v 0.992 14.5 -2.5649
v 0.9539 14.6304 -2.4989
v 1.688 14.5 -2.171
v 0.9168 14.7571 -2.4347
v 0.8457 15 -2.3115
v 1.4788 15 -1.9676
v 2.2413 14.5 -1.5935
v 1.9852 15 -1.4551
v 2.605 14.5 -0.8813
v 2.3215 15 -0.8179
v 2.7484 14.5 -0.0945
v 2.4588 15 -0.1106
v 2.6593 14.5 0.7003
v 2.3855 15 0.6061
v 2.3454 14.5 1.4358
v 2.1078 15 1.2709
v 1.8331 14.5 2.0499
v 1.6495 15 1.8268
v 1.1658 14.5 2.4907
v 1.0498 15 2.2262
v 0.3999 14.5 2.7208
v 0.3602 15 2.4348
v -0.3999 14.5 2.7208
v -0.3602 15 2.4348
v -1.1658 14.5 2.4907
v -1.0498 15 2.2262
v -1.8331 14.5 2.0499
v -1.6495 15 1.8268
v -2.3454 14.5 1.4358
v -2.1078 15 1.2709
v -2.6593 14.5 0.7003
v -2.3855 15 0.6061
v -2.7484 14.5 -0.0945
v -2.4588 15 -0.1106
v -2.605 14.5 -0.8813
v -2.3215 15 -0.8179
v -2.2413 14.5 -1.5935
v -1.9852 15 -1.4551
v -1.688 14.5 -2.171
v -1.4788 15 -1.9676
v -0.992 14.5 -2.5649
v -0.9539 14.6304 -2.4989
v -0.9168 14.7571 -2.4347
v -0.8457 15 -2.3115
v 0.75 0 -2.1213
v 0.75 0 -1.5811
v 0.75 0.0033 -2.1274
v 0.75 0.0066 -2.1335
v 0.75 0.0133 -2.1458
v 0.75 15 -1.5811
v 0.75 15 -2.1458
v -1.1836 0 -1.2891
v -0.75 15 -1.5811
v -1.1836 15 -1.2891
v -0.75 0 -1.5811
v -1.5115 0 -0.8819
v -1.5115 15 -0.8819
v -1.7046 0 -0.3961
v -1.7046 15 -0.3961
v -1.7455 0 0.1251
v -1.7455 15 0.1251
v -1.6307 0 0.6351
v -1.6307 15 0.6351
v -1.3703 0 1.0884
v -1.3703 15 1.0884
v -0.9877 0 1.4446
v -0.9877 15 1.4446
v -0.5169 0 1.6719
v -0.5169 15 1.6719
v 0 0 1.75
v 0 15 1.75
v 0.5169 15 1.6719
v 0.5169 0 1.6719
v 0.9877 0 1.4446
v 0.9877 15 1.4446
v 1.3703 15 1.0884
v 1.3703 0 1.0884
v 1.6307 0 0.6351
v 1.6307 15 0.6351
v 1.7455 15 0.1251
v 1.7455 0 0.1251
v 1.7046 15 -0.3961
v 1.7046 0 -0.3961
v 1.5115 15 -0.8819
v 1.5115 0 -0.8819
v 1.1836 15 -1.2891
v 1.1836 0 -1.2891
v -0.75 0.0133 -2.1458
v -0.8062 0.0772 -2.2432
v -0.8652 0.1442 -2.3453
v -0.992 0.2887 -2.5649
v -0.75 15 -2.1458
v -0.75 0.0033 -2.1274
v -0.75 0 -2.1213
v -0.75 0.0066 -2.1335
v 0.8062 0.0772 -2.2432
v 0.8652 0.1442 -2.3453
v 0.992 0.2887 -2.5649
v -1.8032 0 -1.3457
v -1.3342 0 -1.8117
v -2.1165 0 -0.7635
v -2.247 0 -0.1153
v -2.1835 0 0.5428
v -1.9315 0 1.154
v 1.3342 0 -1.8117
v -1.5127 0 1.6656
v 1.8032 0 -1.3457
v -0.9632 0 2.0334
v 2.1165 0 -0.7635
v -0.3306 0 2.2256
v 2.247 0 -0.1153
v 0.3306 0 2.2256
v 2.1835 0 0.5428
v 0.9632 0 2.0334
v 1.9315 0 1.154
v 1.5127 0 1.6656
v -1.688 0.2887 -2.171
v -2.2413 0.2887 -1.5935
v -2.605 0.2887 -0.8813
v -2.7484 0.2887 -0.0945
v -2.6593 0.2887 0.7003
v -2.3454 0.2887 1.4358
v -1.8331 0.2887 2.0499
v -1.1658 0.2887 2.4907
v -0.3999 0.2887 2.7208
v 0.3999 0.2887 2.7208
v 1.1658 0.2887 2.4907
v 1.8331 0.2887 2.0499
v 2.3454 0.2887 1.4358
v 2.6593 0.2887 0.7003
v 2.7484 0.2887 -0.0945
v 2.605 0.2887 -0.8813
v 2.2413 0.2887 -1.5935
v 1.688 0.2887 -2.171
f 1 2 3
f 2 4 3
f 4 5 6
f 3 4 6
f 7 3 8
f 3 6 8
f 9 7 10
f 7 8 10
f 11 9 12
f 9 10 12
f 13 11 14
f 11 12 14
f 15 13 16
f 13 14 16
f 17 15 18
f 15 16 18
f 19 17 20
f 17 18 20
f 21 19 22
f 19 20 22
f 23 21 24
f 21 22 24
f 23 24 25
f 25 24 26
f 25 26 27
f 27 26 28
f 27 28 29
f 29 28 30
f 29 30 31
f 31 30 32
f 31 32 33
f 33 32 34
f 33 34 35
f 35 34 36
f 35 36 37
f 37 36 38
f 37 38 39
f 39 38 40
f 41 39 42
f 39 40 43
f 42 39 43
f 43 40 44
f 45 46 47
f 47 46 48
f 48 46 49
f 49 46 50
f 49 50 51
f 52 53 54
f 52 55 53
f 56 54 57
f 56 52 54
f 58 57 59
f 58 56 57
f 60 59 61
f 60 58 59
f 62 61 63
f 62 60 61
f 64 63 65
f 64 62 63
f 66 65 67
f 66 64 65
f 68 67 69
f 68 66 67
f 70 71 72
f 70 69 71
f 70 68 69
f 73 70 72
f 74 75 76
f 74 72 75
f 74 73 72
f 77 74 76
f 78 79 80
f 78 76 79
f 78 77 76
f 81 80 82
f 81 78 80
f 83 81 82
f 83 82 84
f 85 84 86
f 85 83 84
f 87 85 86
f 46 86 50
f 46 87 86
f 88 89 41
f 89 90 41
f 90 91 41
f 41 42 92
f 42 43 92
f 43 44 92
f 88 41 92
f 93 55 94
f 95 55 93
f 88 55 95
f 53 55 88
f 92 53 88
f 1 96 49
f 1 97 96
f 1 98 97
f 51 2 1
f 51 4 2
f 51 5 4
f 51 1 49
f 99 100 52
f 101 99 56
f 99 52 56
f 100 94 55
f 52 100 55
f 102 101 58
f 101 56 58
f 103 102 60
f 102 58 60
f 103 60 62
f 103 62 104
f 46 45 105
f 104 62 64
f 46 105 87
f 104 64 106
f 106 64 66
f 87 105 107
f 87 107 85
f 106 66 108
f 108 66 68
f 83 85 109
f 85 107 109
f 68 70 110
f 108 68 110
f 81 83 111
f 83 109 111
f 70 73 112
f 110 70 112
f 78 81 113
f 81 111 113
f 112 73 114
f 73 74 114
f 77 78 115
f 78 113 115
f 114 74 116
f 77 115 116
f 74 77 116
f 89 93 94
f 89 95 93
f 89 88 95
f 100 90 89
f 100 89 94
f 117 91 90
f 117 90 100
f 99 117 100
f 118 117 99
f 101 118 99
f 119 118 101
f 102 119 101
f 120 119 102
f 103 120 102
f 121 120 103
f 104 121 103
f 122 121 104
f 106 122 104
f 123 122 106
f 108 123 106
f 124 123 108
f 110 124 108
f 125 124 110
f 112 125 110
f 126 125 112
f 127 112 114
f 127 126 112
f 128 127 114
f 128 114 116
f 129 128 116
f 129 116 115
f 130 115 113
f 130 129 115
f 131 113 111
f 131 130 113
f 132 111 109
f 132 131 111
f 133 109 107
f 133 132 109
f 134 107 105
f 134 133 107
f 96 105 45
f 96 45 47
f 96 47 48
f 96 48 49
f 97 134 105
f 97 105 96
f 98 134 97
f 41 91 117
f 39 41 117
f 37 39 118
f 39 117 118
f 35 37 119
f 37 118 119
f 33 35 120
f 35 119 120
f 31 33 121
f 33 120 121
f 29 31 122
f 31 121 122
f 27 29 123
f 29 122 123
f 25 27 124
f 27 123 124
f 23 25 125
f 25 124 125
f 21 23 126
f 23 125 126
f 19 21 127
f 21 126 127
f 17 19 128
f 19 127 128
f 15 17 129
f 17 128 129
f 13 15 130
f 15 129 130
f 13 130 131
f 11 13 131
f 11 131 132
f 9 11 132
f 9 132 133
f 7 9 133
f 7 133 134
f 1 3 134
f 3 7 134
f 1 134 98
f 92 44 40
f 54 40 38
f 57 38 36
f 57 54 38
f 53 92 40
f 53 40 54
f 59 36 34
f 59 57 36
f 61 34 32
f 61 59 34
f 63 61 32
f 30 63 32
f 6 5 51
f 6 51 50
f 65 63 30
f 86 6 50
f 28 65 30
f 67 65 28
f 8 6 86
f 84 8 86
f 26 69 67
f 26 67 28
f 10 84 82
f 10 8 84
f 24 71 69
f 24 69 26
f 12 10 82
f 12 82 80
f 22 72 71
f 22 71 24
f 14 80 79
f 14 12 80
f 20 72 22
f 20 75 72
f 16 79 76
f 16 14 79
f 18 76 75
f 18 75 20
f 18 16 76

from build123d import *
from OCP.BRepFilletAPI import BRepFilletAPI_MakeChamfer

# Parameters (mm, degrees)
ESBO_O1_R                = 2.75
ESBO_O1_R_2              = 1.75
RESSALTO_EXTRUS_O1_DEPTH = 15
ESBO_O2_W                = 1.5
ESBO_O2_H                = 2.767894019
CORTE_EXTRUS_O1_DEPTH    = 16.495967217
CHANFRO1_SIZE            = 0.5
CHANFRO2_SIZE            = 0.5
CHANFRO2_SIZE2           = 0.288675135


with BuildPart() as part:
    # Esboço1 → Ressalto-extrusão1 (new body)
    with BuildSketch(Plane(origin=(0, 0, 0), x_dir=(1, 0, 0), z_dir=(0, 1, 0))):
        with Locations(Location((0, 0, 0), (0, 0, 270))):
            Circle(ESBO_O1_R)
        with Locations(Location((0, 0, 0), (0, 0, 270))):
            Circle(ESBO_O1_R_2, mode=Mode.SUBTRACT)
    extrude(amount=RESSALTO_EXTRUS_O1_DEPTH)

    # Esboço2 → Corte-extrusão1 (cut, through all)
    with BuildSketch(Plane(origin=(0, 15, 0), x_dir=(1, 0, 0), z_dir=(0, 1, 0))):
        with Locations((0, 1.747513295)):
            Rectangle(ESBO_O2_W, ESBO_O2_H)
    extrude(amount=-CORTE_EXTRUS_O1_DEPTH, mode=Mode.SUBTRACT)

    # Chanfro1
    # the kernel refuses this chamfer: 0.5, 0.257849129 mm, written as the material it takes off along each edge
    with BuildSketch(Plane(origin=(-0.75, 16.293542877, -2.645751311), x_dir=(-0.9484043695289113, 0, 0.3170633246821023), z_dir=(0, -1, 0))) as chanfro1_piece_1:
        with BuildLine():
            Line((0.25513486, 0), (CHANFRO1_SIZE * 0.317063324682, -CHANFRO1_SIZE * 0.948404369529))
            Line((CHANFRO1_SIZE * 0.317063324682, -CHANFRO1_SIZE * 0.948404369529), (0, 0))
            ThreePointArc((0, 0), (0.129558651, 0.002959681), (0.25513486, 0))
        make_face()
    extrude(amount=17.587085755, mode=Mode.SUBTRACT)
    with BuildSketch(Plane(origin=(0.75, 16.293542877, -2.645751311), x_dir=(0.948404369528912, 0, 0.3170633246821001), z_dir=(0, -1, 0))) as chanfro1_piece_2:
        with BuildLine():
            Line((0.25513486, 0), (CHANFRO1_SIZE * 0.317063324682, CHANFRO1_SIZE * 0.948404369529))
            Line((CHANFRO1_SIZE * 0.317063324682, CHANFRO1_SIZE * 0.948404369529), (0, 0))
            ThreePointArc((0, 0), (0.129558651, -0.002959681), (0.25513486, 0))
        make_face()
    extrude(amount=17.587085755, mode=Mode.SUBTRACT)

    # Chanfro2: one chamfer whose edges measure the first distance from different faces: ONE call of the kernel's chamfer builder (chamfer() names one face for all edges)
    chanfro2_edges_1 = [part.edges().sort_by_distance(p)[0] for p in [
        (0, 0, 2.75),
    ]]
    chanfro2_side_1 = [part.faces().sort_by_distance(p)[0] for p in [
        (-0.937222417, 0, -2.31706246),
    ]]
    chanfro2_edges_2 = [part.edges().sort_by_distance(p)[0] for p in [
        (0, 15, 2.75),
    ]]
    chanfro2_side_2 = [part.faces().sort_by_distance(p)[0] for p in [
        (0, 7.5, 2.75),
    ]]
    chanfro2 = BRepFilletAPI_MakeChamfer(part.part.solid().wrapped)
    for e in chanfro2_edges_1:
        chanfro2.Add(CHANFRO2_SIZE, CHANFRO2_SIZE2, e.wrapped, chanfro2_side_1[0].wrapped)  # the first distance lies on this face
    for e in chanfro2_edges_2:
        chanfro2.Add(CHANFRO2_SIZE, CHANFRO2_SIZE2, e.wrapped, chanfro2_side_2[0].wrapped)  # the first distance lies on this face
    add(Compound.cast(chanfro2.Shape()), mode=Mode.REPLACE)


solid = part.part
